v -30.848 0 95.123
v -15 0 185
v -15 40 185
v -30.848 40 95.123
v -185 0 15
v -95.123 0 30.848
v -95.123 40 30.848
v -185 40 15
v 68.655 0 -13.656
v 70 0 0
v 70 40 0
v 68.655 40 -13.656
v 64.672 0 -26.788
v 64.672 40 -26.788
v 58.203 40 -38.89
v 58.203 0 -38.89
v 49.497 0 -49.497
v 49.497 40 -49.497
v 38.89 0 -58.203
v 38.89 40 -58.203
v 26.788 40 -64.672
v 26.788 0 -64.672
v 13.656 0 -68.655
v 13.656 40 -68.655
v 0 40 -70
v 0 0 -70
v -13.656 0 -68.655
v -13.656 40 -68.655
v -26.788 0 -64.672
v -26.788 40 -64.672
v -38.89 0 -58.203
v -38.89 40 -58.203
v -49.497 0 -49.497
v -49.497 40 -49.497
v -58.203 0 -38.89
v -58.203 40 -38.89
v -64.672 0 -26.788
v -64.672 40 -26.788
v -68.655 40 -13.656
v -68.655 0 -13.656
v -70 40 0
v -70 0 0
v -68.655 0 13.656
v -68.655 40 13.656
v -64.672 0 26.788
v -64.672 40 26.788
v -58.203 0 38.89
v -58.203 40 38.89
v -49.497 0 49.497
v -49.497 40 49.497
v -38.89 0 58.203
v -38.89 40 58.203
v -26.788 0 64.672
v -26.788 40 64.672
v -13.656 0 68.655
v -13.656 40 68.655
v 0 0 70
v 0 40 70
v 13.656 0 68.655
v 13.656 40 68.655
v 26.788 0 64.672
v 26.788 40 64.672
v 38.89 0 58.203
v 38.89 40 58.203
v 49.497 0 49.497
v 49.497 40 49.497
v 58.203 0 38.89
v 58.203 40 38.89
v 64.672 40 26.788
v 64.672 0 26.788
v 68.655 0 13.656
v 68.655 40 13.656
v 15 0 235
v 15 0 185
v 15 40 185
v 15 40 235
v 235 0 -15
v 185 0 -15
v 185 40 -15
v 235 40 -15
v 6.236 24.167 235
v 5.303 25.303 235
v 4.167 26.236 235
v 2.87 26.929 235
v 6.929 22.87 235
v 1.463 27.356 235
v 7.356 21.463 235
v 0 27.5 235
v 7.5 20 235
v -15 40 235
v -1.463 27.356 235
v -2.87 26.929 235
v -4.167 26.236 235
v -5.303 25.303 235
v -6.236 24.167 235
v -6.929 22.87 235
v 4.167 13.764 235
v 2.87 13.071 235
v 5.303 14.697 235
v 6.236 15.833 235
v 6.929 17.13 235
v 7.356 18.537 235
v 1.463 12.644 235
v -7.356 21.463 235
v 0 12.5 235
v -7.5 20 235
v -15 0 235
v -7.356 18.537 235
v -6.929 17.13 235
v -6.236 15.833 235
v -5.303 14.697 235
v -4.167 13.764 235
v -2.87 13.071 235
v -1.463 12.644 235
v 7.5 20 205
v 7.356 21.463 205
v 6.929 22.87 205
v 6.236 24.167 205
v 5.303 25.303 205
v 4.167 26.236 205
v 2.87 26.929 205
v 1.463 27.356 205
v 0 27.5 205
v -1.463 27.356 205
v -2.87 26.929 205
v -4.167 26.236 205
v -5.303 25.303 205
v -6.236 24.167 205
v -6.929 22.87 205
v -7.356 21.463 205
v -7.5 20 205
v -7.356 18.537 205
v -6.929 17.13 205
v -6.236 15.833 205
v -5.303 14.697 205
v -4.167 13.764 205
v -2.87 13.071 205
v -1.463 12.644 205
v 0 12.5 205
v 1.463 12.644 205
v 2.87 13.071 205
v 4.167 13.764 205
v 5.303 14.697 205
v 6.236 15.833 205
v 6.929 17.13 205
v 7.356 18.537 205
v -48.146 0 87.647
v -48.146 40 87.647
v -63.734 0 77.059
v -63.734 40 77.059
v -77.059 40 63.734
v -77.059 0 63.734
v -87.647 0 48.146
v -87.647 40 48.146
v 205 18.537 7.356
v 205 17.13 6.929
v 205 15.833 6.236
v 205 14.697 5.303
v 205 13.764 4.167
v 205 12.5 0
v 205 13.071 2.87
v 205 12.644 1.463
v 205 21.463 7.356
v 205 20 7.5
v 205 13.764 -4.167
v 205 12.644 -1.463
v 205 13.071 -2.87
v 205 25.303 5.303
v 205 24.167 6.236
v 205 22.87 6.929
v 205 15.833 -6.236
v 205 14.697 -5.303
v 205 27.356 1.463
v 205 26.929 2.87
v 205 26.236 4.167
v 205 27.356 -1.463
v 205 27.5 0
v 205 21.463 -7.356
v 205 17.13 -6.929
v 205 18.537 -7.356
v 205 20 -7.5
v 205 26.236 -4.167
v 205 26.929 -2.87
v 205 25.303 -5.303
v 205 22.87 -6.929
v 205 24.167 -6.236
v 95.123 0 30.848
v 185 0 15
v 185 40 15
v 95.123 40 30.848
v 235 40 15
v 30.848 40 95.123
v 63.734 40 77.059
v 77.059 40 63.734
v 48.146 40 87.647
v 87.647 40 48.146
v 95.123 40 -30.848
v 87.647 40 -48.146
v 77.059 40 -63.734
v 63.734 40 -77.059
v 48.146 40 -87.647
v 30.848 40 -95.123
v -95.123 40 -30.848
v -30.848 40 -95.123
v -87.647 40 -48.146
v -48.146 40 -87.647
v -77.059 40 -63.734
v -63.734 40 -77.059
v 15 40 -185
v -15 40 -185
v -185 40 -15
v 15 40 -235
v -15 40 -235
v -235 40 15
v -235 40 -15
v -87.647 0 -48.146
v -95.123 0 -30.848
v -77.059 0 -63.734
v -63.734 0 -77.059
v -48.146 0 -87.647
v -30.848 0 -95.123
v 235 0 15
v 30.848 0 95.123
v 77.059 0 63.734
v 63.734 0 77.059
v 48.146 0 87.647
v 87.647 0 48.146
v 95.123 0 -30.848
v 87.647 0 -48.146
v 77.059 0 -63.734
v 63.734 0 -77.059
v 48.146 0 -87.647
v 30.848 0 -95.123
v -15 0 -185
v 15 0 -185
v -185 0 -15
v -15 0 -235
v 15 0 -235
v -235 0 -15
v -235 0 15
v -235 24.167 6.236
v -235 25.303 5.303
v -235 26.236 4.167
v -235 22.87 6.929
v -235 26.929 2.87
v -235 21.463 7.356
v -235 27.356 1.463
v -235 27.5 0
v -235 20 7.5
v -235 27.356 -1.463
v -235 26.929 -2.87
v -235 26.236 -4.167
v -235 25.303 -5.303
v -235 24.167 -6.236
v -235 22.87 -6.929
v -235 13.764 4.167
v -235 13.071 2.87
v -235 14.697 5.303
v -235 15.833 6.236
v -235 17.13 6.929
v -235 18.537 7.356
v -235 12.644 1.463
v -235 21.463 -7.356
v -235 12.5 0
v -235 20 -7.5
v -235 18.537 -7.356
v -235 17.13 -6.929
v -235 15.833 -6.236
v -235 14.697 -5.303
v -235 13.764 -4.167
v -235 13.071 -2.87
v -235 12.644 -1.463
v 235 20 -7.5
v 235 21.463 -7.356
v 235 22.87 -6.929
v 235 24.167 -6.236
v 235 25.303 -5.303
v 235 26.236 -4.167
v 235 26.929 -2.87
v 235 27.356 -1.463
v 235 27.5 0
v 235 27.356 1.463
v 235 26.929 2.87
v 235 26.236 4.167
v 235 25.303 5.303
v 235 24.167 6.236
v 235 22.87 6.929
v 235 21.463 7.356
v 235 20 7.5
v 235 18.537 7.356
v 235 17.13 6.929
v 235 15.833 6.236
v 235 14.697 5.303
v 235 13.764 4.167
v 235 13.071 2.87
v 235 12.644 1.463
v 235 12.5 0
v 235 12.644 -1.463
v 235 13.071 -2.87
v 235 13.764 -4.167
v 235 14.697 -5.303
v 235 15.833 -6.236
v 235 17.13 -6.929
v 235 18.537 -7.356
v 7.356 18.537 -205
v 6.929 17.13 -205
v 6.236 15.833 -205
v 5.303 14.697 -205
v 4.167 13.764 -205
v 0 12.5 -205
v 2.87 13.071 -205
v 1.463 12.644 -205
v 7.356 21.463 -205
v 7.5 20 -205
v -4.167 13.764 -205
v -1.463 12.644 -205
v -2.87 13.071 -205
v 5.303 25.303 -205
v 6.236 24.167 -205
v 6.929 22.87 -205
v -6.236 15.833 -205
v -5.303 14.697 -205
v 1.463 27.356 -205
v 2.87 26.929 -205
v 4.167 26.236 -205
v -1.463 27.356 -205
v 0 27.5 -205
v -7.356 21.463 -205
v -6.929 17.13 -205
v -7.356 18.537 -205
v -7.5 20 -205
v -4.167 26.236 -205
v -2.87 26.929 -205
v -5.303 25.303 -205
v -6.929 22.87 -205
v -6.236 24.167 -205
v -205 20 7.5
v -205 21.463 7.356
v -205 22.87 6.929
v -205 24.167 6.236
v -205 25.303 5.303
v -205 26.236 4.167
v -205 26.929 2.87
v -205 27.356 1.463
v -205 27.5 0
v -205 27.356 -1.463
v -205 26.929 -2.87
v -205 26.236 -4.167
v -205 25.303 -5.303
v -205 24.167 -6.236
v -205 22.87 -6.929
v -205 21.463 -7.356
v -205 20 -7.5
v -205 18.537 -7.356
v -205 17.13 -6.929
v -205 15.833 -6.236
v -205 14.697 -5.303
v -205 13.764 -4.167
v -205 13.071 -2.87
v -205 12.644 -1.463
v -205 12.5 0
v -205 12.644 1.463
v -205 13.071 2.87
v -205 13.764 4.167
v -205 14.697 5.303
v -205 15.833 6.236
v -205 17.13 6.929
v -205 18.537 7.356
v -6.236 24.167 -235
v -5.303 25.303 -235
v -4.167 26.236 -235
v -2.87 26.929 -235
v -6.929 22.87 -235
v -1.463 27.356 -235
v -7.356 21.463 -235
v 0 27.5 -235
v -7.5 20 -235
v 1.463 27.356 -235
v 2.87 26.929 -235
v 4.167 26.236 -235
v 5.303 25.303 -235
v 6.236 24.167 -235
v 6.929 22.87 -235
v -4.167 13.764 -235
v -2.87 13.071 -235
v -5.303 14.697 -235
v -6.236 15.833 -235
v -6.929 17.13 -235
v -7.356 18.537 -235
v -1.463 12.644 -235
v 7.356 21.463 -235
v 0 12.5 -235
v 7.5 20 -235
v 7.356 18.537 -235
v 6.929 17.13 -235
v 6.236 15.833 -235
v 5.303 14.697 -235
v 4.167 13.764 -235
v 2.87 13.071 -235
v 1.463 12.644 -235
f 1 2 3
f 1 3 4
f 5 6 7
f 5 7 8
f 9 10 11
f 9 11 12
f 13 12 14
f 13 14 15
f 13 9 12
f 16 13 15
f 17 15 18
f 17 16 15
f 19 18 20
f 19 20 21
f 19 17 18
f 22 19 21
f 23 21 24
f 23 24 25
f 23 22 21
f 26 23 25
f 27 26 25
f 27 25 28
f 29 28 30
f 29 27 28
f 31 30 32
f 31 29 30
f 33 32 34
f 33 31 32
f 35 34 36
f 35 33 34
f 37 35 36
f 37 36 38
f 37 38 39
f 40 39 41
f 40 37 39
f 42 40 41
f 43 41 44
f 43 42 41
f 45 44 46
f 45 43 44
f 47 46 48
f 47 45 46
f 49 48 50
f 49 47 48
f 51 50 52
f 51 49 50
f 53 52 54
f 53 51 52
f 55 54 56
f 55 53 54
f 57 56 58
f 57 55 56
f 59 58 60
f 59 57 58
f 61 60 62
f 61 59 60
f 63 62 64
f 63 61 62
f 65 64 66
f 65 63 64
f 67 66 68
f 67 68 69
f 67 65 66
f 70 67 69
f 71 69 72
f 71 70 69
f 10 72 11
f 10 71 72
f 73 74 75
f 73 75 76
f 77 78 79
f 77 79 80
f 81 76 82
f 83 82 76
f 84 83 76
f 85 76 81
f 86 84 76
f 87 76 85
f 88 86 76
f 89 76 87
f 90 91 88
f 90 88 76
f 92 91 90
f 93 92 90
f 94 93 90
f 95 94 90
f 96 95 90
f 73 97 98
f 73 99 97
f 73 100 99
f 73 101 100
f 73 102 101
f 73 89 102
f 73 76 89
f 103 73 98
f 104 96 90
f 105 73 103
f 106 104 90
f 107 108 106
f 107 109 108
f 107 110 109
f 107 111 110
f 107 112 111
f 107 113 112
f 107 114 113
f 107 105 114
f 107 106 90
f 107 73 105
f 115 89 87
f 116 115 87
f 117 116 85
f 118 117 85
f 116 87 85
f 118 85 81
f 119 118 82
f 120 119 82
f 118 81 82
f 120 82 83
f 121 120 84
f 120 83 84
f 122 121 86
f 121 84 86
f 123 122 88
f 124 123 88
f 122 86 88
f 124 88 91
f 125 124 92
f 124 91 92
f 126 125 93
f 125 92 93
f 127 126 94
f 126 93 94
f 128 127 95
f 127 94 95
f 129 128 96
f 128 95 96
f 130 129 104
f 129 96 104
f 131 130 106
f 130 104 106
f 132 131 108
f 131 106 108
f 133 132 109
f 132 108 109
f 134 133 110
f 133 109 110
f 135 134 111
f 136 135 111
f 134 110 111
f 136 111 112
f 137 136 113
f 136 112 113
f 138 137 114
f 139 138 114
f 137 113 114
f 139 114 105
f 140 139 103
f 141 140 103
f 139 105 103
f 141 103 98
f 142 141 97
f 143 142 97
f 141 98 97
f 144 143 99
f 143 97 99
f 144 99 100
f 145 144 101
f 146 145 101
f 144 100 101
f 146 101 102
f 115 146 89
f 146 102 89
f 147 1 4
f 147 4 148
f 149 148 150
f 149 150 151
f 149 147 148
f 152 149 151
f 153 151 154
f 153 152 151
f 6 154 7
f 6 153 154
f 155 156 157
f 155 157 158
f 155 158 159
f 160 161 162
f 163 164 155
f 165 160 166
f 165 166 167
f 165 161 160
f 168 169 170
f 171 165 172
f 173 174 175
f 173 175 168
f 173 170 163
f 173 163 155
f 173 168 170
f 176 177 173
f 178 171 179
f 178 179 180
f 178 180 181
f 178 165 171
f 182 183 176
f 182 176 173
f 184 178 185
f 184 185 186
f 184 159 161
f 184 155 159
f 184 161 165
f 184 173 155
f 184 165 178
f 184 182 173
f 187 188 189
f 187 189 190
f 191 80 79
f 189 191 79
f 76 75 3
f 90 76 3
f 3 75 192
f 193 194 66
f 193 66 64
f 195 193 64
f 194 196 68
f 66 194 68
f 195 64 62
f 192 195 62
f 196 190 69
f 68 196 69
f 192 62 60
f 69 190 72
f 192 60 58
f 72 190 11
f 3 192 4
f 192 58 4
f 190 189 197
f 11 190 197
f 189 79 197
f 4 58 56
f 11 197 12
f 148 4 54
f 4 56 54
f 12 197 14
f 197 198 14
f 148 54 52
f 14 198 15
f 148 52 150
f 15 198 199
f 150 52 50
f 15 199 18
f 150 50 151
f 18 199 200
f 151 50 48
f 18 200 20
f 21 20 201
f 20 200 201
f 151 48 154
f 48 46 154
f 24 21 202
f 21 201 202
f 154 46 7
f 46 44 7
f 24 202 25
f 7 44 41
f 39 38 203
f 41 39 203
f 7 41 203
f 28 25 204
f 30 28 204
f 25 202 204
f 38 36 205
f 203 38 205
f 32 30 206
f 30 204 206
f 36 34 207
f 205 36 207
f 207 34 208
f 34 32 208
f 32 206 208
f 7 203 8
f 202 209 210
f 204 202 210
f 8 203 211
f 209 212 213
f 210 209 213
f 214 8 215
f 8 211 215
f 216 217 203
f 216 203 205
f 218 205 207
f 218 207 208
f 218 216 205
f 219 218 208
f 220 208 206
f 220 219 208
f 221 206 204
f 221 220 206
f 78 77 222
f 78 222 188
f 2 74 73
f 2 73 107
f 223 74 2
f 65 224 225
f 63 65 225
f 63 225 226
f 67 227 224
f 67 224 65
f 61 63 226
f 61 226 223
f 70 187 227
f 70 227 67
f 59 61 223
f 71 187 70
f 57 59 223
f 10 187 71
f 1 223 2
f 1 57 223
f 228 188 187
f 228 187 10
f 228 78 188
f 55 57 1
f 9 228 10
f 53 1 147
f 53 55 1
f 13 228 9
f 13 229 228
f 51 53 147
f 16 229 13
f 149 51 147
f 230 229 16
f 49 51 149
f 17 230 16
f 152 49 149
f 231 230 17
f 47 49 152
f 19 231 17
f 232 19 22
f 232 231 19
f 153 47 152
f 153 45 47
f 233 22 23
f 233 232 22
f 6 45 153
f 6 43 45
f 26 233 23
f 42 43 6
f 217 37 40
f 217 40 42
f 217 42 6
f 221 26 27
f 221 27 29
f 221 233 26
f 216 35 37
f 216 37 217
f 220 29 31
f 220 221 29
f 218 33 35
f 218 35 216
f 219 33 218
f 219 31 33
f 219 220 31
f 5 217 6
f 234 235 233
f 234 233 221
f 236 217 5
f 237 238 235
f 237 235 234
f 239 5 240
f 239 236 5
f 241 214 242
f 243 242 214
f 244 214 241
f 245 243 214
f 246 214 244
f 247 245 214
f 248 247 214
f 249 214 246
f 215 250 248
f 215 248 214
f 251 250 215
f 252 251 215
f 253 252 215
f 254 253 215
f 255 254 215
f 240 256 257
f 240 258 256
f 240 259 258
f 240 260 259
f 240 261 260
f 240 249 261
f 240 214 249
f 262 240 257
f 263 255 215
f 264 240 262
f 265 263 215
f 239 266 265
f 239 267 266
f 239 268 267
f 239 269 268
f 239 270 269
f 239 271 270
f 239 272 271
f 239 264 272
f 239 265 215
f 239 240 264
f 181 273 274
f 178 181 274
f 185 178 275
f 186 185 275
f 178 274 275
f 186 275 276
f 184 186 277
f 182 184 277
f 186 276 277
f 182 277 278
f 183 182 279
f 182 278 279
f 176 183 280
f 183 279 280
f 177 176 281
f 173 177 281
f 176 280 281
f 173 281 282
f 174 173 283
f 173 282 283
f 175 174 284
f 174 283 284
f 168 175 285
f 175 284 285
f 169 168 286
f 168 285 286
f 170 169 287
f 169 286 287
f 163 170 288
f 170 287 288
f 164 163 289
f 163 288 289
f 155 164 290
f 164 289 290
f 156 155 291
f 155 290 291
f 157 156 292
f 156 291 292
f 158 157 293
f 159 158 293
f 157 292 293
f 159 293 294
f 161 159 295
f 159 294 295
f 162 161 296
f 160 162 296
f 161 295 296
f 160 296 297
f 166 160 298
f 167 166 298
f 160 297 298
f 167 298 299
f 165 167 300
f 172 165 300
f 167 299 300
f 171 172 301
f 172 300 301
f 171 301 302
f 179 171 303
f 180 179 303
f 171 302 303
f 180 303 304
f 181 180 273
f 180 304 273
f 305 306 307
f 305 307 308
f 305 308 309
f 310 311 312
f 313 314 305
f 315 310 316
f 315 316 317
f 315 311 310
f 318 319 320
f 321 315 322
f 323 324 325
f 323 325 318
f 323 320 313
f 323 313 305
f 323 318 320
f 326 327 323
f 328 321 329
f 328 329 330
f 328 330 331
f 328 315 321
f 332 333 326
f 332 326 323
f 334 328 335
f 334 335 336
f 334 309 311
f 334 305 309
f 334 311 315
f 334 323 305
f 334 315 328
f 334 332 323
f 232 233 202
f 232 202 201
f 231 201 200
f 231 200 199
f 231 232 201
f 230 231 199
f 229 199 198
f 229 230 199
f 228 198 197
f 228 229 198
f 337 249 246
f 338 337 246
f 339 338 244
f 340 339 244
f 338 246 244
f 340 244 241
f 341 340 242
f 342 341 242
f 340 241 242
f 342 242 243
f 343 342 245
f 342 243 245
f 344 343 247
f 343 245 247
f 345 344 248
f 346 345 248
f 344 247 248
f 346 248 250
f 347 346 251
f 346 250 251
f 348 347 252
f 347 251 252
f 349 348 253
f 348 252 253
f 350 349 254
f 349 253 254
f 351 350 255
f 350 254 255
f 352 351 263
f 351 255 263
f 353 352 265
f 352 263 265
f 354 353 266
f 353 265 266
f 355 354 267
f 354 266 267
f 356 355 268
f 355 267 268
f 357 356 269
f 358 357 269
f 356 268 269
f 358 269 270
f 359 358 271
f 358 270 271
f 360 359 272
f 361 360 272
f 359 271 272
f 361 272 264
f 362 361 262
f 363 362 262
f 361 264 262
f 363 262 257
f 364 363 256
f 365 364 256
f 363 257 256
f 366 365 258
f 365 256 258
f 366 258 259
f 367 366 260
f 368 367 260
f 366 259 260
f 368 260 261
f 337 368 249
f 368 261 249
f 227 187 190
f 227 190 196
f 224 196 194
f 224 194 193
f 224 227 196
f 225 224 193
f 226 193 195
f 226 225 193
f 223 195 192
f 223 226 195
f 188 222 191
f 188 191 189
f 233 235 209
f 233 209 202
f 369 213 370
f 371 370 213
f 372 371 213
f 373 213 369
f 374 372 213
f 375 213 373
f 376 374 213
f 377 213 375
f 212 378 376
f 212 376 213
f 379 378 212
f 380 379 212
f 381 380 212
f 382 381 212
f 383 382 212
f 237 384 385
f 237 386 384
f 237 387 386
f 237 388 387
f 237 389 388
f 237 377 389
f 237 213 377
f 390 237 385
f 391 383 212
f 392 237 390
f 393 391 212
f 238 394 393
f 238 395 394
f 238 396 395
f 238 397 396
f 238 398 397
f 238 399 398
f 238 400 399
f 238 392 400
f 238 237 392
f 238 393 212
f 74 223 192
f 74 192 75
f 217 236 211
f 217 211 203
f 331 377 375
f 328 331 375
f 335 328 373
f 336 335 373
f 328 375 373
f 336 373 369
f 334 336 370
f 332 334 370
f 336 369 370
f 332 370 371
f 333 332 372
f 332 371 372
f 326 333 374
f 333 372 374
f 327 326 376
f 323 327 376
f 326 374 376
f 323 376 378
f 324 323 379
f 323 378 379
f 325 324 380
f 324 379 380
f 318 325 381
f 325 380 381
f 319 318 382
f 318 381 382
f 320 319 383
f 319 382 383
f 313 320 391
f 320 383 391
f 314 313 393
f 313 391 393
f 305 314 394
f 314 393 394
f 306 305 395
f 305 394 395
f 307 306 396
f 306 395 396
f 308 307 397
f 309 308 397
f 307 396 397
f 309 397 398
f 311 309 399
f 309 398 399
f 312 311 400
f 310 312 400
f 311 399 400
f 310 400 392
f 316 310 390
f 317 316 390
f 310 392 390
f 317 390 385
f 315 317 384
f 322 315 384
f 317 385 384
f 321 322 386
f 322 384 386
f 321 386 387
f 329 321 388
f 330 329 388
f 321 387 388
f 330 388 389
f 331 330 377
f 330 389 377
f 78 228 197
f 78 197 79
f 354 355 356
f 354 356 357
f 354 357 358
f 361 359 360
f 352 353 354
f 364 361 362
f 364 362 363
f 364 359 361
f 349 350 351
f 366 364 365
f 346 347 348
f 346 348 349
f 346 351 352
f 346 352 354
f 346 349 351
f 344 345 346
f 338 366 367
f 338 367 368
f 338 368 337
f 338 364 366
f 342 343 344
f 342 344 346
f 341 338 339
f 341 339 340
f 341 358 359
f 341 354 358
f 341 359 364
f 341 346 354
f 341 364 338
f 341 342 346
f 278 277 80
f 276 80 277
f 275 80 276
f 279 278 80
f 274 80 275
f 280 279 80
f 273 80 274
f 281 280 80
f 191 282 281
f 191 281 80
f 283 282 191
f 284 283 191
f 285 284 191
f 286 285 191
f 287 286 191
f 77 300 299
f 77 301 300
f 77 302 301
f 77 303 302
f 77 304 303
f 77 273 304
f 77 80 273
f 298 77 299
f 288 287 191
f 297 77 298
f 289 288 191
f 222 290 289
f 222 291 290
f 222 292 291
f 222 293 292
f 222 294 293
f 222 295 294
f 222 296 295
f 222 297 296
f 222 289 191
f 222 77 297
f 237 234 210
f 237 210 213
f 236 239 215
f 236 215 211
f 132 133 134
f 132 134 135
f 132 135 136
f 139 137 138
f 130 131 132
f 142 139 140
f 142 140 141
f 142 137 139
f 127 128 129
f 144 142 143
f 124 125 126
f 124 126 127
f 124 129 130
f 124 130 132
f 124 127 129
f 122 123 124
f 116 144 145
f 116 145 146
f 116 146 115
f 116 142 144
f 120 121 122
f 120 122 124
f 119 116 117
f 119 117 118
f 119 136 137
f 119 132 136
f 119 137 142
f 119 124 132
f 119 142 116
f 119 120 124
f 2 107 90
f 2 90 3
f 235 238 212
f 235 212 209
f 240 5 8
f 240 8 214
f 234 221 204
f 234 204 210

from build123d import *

# Parameters (mm, degrees)
SKETCH1_R           = 70
BOSS_EXTRUDE1_DEPTH = 40
SKETCH2_R           = 7.5
CUT_EXTRUDE1_DEPTH  = 30
CIRPATTERN1_COUNT   = 4


with BuildPart() as part:
    # Sketch1 → Boss-Extrude1 (new body)
    with BuildSketch(Plane(origin=(0, 0, 0), x_dir=(1, 0, 0), z_dir=(0, 1, 0))):
        with BuildLine():
            Line((95.123177318, 30.847708779), (185, 15))
            Line((185, 15), (235, 15))
            Line((235, 15), (235, -15))
            Line((235, -15), (185, -15))
            Line((185, -15), (95.123177318, -30.847708779))
            ThreePointArc((95.123177318, -30.847708779), (70.710678119, -70.710678119), (30.847708779, -95.123177318))
            Line((30.847708779, -95.123177318), (15, -185))
            Line((15, -185), (15, -235))
            Line((15, -235), (-15, -235))
            Line((-15, -235), (-15, -185))
            Line((-15, -185), (-30.847708779, -95.123177318))
            ThreePointArc((-30.847708779, -95.123177318), (-70.710678119, -70.710678119), (-95.123177318, -30.847708779))
            Line((-95.123177318, -30.847708779), (-185, -15))
            Line((-185, -15), (-235, -15))
            Line((-235, -15), (-235, 15))
            Line((-235, 15), (-185, 15))
            Line((-185, 15), (-95.123177318, 30.847708779))
            ThreePointArc((-95.123177318, 30.847708779), (-70.710678119, 70.710678119), (-30.847708779, 95.123177318))
            Line((-30.847708779, 95.123177318), (-15, 185))
            Line((-15, 185), (-15, 235))
            Line((-15, 235), (15, 235))
            Line((15, 235), (15, 185))
            Line((15, 185), (30.847708779, 95.123177318))
            ThreePointArc((30.847708779, 95.123177318), (70.710678119, 70.710678119), (95.123177318, 30.847708779))
        make_face()
        Circle(SKETCH1_R, mode=Mode.SUBTRACT)
    extrude(amount=BOSS_EXTRUDE1_DEPTH)

    # Sketch2 → Cut-Extrude1 (cut)
    with BuildSketch(Plane.XY.offset(235)):
        with Locations((0, 20)):
            Circle(SKETCH2_R)
    cut_extrude1 = extrude(amount=-CUT_EXTRUDE1_DEPTH, mode=Mode.SUBTRACT)

    # CirPattern1: Cut-Extrude1 ×4 about axis
    cirpattern1_axis = Axis((0, 0, 0), (0, 1, 0))
    for i in range(1, CIRPATTERN1_COUNT):
        add(cut_extrude1.rotate(cirpattern1_axis, i * 360 / CIRPATTERN1_COUNT), mode=Mode.SUBTRACT)


solid = part.part
